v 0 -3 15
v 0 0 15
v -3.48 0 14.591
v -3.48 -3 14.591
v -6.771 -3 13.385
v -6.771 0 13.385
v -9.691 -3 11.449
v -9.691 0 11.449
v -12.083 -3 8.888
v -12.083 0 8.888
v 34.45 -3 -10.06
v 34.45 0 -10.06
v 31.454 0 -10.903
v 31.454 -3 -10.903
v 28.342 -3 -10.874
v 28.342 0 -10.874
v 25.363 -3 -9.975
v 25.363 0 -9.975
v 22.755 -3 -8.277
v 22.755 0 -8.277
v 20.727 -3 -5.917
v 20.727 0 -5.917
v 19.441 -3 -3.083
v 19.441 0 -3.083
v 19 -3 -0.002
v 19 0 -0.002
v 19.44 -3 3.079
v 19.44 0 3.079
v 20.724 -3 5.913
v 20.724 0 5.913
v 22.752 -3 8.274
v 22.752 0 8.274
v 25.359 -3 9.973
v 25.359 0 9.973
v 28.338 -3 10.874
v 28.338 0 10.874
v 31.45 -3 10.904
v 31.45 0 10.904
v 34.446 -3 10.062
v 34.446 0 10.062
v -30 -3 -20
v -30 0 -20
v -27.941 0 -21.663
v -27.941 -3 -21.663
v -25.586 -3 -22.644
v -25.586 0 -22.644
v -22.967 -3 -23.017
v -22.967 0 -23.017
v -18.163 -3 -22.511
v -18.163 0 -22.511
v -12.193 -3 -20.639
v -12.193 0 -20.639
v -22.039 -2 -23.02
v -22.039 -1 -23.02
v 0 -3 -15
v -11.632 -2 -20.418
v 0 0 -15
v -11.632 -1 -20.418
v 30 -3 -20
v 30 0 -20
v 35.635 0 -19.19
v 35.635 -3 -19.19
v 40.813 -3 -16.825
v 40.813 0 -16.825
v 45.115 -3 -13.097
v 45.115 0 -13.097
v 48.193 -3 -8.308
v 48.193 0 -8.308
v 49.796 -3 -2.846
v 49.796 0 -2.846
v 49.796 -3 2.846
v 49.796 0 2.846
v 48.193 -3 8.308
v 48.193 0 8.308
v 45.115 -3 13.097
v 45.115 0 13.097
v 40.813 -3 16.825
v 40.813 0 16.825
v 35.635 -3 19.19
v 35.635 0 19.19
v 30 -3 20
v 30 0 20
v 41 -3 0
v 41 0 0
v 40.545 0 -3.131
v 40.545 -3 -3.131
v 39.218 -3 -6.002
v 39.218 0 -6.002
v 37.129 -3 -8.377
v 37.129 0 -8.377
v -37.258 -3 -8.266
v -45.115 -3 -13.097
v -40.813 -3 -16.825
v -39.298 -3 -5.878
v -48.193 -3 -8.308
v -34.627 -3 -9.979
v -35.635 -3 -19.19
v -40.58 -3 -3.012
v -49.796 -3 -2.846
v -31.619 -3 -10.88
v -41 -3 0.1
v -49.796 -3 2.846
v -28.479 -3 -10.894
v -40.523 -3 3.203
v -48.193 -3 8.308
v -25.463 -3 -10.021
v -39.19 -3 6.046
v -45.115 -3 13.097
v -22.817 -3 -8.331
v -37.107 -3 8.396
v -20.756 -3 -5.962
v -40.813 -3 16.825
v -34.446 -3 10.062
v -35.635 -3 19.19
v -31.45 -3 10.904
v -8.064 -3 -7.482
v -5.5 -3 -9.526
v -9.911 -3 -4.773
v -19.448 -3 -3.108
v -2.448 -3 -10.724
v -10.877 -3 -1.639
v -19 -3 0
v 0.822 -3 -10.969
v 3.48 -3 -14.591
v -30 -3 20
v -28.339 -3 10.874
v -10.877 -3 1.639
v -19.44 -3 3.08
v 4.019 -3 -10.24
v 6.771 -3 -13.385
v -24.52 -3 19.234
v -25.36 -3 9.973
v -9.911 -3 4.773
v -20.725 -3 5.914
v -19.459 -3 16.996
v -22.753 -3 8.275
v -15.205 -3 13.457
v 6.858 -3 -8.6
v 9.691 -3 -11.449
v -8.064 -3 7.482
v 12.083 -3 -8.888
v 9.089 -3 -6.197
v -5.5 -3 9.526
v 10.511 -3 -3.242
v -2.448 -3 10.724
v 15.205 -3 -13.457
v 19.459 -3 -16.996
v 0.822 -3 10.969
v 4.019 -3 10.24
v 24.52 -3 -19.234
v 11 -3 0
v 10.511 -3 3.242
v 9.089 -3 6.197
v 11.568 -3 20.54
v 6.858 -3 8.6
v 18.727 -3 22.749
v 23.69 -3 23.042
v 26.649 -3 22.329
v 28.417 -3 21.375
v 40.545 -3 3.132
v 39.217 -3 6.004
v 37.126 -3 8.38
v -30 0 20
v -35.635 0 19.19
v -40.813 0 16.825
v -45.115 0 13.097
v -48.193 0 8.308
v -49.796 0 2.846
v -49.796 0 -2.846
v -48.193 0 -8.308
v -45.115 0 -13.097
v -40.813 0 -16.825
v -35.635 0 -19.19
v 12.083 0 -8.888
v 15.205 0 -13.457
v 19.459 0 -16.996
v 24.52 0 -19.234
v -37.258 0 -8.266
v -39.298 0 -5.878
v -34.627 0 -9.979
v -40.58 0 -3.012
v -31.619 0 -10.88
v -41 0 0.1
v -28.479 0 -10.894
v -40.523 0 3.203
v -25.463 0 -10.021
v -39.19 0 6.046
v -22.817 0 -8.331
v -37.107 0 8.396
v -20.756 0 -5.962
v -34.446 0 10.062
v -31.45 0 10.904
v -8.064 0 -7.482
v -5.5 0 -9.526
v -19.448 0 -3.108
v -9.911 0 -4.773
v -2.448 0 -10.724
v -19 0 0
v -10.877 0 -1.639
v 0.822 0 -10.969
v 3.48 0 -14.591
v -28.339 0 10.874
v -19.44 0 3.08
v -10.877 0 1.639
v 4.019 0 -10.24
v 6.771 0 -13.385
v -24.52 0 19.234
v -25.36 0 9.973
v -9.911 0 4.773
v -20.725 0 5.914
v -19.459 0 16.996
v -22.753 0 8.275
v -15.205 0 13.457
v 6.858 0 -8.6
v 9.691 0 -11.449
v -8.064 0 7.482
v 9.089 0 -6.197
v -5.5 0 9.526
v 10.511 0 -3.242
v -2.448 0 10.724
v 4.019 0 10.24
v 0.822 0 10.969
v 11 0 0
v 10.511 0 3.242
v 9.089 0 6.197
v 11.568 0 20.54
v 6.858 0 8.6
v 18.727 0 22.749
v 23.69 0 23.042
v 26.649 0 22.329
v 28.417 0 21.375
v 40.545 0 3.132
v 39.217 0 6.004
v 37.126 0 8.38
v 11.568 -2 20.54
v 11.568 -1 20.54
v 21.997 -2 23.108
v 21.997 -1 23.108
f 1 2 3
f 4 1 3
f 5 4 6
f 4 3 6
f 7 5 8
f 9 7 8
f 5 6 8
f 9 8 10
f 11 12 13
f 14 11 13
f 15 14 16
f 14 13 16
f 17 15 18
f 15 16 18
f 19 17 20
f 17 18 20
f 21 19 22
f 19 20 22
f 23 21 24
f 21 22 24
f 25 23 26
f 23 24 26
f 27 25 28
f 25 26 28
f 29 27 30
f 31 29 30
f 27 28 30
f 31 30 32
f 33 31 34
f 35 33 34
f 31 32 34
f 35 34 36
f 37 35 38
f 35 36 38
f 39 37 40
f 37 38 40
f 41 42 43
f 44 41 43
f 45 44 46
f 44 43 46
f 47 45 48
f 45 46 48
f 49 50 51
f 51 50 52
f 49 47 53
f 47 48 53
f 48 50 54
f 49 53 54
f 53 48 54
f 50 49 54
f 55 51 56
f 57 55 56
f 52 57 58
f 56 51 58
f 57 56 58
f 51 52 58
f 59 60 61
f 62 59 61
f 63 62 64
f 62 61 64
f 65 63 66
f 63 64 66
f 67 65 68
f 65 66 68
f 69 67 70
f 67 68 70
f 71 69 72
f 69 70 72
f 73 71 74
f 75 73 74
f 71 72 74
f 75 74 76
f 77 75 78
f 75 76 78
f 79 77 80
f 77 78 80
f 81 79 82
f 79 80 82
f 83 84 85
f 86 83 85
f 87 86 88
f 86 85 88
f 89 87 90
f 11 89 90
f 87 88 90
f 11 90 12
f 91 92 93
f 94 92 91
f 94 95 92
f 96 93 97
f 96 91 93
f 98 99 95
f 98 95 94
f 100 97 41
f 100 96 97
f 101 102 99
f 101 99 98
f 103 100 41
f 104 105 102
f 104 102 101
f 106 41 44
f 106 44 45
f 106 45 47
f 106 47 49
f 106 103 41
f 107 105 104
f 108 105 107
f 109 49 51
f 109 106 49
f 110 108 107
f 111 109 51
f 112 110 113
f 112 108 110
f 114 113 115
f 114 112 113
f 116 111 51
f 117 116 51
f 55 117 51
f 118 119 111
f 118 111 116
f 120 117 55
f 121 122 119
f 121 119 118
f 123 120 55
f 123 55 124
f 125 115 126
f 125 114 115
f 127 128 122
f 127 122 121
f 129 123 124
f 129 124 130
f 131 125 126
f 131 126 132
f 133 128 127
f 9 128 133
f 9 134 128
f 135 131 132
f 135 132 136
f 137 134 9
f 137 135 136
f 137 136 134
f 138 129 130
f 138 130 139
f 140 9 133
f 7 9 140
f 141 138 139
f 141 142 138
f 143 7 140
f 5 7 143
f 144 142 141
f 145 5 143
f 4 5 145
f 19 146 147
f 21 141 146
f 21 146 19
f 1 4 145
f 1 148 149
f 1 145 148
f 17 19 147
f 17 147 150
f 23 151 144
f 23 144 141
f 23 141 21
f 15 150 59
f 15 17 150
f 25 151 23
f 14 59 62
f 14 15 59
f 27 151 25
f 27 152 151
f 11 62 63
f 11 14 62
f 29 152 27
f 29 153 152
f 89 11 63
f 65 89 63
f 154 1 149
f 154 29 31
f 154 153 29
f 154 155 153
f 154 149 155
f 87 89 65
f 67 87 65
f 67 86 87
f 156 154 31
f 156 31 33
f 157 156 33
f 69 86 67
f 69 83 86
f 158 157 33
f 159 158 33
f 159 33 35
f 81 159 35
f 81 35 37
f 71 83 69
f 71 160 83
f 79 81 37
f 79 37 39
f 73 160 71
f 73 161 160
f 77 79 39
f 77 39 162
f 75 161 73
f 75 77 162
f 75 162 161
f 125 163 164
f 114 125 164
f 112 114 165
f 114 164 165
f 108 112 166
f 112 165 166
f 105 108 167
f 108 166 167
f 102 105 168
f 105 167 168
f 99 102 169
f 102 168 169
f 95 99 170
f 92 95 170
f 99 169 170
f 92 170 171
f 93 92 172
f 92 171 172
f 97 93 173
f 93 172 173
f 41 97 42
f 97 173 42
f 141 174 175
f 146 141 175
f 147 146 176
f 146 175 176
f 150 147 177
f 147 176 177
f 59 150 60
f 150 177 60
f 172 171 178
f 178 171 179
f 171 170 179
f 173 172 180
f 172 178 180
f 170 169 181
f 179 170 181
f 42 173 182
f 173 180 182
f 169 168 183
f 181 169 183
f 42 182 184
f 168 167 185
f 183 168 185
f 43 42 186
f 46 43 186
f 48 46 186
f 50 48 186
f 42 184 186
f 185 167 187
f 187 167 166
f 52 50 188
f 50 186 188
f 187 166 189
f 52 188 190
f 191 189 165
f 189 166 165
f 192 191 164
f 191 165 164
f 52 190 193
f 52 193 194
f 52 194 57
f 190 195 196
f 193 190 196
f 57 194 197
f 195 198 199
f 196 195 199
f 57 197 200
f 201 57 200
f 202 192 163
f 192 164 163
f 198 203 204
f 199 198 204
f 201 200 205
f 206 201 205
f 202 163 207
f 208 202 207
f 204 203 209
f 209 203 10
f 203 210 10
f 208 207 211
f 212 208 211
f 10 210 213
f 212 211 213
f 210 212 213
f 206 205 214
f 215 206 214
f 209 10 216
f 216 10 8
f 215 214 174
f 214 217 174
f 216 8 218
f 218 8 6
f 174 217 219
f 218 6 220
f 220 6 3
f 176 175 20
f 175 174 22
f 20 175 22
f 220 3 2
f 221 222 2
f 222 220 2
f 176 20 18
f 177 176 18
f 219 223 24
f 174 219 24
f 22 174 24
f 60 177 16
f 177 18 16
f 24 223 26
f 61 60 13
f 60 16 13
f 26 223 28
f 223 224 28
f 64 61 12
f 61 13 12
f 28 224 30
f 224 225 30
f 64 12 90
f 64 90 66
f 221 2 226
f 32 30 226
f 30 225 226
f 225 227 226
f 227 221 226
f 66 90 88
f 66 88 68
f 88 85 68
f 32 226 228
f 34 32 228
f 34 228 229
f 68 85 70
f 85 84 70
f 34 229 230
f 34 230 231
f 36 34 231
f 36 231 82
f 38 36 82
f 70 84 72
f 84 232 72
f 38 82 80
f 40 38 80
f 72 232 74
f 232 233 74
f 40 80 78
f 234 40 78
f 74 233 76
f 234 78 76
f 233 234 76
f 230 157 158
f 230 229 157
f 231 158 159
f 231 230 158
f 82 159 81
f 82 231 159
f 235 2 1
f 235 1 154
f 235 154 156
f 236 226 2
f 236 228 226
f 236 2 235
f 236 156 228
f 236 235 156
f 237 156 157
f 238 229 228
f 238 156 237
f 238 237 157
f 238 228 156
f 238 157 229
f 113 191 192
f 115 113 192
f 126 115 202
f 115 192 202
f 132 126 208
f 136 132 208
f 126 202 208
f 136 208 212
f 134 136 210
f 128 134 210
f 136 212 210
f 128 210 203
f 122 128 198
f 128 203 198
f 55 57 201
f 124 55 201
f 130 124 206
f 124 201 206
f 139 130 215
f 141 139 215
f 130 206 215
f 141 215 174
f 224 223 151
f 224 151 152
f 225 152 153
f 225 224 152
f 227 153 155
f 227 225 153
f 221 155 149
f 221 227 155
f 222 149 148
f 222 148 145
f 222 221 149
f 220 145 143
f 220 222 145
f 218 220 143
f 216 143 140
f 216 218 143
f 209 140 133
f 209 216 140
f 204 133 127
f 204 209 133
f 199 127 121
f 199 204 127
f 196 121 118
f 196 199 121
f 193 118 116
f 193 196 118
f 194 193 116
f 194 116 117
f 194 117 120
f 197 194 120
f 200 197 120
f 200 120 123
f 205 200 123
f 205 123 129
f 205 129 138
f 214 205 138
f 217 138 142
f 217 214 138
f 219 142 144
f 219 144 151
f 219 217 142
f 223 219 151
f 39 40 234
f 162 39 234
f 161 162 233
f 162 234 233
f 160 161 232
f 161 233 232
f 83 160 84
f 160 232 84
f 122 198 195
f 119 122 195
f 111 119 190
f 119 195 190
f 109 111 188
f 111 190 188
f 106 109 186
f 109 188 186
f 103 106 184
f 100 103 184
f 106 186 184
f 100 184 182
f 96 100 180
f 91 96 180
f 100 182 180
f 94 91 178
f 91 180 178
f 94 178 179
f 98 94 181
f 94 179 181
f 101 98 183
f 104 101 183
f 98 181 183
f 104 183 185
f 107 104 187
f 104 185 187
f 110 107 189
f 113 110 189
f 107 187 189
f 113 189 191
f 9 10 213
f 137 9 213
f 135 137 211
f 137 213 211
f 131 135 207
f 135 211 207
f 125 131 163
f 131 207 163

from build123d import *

# Parameters (mm, degrees)
F0_R     = 11
F1_DEPTH = 3


with BuildPart() as f1:
    # F0 (on Front) → F1 (new body)
    with BuildSketch(Plane.XZ):
        with BuildLine():
            ThreePointArc((34.4457053252, 10.0615955075), (39.2169072518, 6.0040503586), (41, -2e-10))
            ThreePointArc((41, -2e-10), (39.218122302, -6.0021847046), (34.4497779591, -10.0597950337))
            add(Edge.make_bspline(
                [(34.4497779591, -10.0597950337), (33.5572864984, -14.2139641421), (32.0732731389, -17.7845741491), (30, -20)],
                knots=[0.5781750695, 0.5781750695, 0.5781750695, 0.5781750695, 0.6822186894, 0.6822186894, 0.6822186894, 0.6822186894], degree=3))
            ThreePointArc((30, -20), (50, 0), (30, 20))
            add(Edge.make_bspline(
                [(30, 20), (32.0727475467, 17.7685869814), (33.5539058525, 14.2021827738), (34.4457053252, 10.0615955075)],
                knots=[0.3177813106, 0.3177813106, 0.3177813106, 0.3177813106, 0.4213364669, 0.4213364669, 0.4213364669, 0.4213364669], degree=3))
        make_face()
        with BuildLine():
            ThreePointArc((34.4497779591, -10.0597950337), (19.0000002253, -0.0022264354), (34.4457053252, 10.0615955075))
            add(Edge.make_bspline(
                [(30, 20), (32.0727475467, 17.7685869814), (33.5539058525, 14.2021827738), (34.4457053252, 10.0615955075)],
                knots=[0.3177813106, 0.3177813106, 0.3177813106, 0.3177813106, 0.4213364669, 0.4213364669, 0.4213364669, 0.4213364669], degree=3))
            add(Edge.make_bspline(
                [(0, 15), (11.7076504976, 21.1235117167), (23.6393275279, 26.8475716609), (30, 20)],
                knots=[0, 0, 0, 0, 0.3177813106, 0.3177813106, 0.3177813106, 0.3177813106], degree=3))
            ThreePointArc((0, 15), (-6.7706330465, 13.3850113242), (-12.0833333333, 8.8878037532))
            ThreePointArc((-12.0833333333, 8.8878037532), (-19.4585597536, 16.9964124901), (-30, 20))
            add(Edge.make_bspline(
                [(-30, 20), (-32.0727475467, 17.7685869814), (-33.5539058525, 14.2021827738), (-34.4457053252, 10.0615955075)],
                knots=[0.3177813106, 0.3177813106, 0.3177813106, 0.3177813106, 0.4213364669, 0.4213364669, 0.4213364669, 0.4213364669], degree=3))
            ThreePointArc((-34.4457053252, 10.0615955075), (-23.9959496412, 9.2169072516), (-19, -2e-10))
            ThreePointArc((-19, -2e-10), (-23.9978152957, -9.2181223023), (-34.4497779591, -10.0597950337))
            add(Edge.make_bspline(
                [(-34.4497779591, -10.0597950337), (-33.5572864984, -14.2139641421), (-32.0732731389, -17.7845741491), (-30, -20)],
                knots=[0.5781750695, 0.5781750695, 0.5781750695, 0.5781750695, 0.6822186894, 0.6822186894, 0.6822186894, 0.6822186894], degree=3))
            add(Edge.make_bspline(
                [(-30, -20), (-23.6675842682, -26.7665939655), (-11.8380817304, -20.8909455716), (0, -15)],
                knots=[0.6822186894, 0.6822186894, 0.6822186894, 0.6822186894, 1, 1, 1, 1], degree=3))
            ThreePointArc((0, -15), (6.7706330465, -13.3850113242), (12.0833333333, -8.8878037532))
            ThreePointArc((12.0833333333, -8.8878037532), (19.4585597536, -16.9964124901), (30, -20))
            add(Edge.make_bspline(
                [(34.4497779591, -10.0597950337), (33.5572864984, -14.2139641421), (32.0732731389, -17.7845741491), (30, -20)],
                knots=[0.5781750695, 0.5781750695, 0.5781750695, 0.5781750695, 0.6822186894, 0.6822186894, 0.6822186894, 0.6822186894], degree=3))
        make_face()
        Circle(F0_R, mode=Mode.SUBTRACT)
        with BuildLine():
            add(Edge.make_bspline(
                [(-30, 20), (-32.0727475467, 17.7685869814), (-33.5539058525, 14.2021827738), (-34.4457053252, 10.0615955075)],
                knots=[0.3177813106, 0.3177813106, 0.3177813106, 0.3177813106, 0.4213364669, 0.4213364669, 0.4213364669, 0.4213364669], degree=3))
            ThreePointArc((-30, 20), (-50, 0), (-30, -20))
            add(Edge.make_bspline(
                [(-34.4497779591, -10.0597950337), (-33.5572864984, -14.2139641421), (-32.0732731389, -17.7845741491), (-30, -20)],
                knots=[0.5781750695, 0.5781750695, 0.5781750695, 0.5781750695, 0.6822186894, 0.6822186894, 0.6822186894, 0.6822186894], degree=3))
            ThreePointArc((-34.4497779591, -10.0597950337), (-40.9999997747, 0.0022264349), (-34.4457053252, 10.0615955075))
        make_face()
    extrude(amount=F1_DEPTH)


solid = f1.part
